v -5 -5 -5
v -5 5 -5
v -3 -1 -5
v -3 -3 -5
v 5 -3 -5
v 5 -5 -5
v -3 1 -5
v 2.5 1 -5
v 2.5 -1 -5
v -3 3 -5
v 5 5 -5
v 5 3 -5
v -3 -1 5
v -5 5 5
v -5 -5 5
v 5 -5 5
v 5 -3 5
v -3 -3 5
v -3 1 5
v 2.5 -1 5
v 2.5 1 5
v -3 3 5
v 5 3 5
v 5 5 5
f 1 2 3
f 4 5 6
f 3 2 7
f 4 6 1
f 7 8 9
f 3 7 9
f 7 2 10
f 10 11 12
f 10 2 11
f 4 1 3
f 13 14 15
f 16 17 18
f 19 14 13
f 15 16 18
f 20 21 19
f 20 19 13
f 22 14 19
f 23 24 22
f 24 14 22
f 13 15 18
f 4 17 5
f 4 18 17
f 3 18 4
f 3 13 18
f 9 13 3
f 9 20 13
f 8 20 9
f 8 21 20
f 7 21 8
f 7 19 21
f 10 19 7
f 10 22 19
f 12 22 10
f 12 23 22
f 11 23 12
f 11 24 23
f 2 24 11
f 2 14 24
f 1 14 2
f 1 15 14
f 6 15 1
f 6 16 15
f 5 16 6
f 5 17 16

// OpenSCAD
// Generated by SolidPython 1.1.3 on 2025-02-20 02:12:07
$fn=50;


translate(v = [-5.0000000000, -5.0000000000, -5.0000000000]) {
	linear_extrude(height = 10) {
		polygon(points = [[0, 0], [10, 0], [10, 2.0000000000], [2.0000000000, 2.0000000000], [2.0000000000, 4.0000000000], [7.5000000000, 4.0000000000], [7.5000000000, 6.0000000000], [2.0000000000, 6.0000000000], [2.0000000000, 8.0000000000], [10, 8.0000000000], [10, 10], [0, 10]]);
	}
}
/***********************************************
*********      SolidPython code:      **********
************************************************
 
from solid import *
from solid.utils import *

import math
import matplotlib.pyplot as plt
import subprocess
import os

class Hole:
    def __init__(self, x, y, radius):
        """
        Hole defined by:
        :param x: x dimension for center point of the circle as a ratio of letter height
        :param y: y dimension for center point of the circle as a ratio of letter height
        :param radius: radius of circle as a ratio of letter height
        """
        self.x = x
        self.y = y
        self.radius = radius

class Letter3D:
    def __init__(self, name, outer_shape_points, height, holes=[]):
        """
        3D Letter defined by:
        :param name: name of letter
        :param outer_shape_points: points defining the outer shape of the letter
        :param heigh: size of cube that letter fits inside
        :param holes: list of Holes
        """
        self.name = name
        self.outer_shape_points = outer_shape_points
        self.holes = holes
        self.height = height

    def render(self):
        shape = polygon(points=self.outer_shape_points)

        if self.holes:
            for hole in self.holes:
                circle_hole = circle(r=hole.radius*self.height)
                positioned_hole = translate([hole.x*self.height, hole.y*self.height])(circle_hole)
                shape = difference()(shape, positioned_hole)
        
        shape_3d = linear_extrude(height=self.height)(shape)
        shape_3d = translate([-self.height/2, -self.height/2, -self.height/2])(shape_3d)
        
        scad_render_to_file(shape_3d, f"output/{self.name}.scad", file_header='$fn=50;')
        subprocess.run(["C:\\Program Files\\OpenSCAD\\openscad.exe", "-o", f"output\\{self.name}.stl", f"output\\{self.name}.scad"])
                

def arc_points(radius, start_angle, end_angle, center=[0,0], num_points=50):
    angles = [start_angle + i * (end_angle - start_angle) / (num_points - 1)
              for i in range(num_points)]
    points = [
        (center[0] + radius * math.cos(math.radians(angle)),
         center[1] + radius * math.sin(math.radians(angle)))
        for angle in angles
    ]
    return points

def letter_A(h):
    shape_points = [(0,0), (h/2, h), (h, 0), (5/6*h, 0), (2/3*h, 1/3*h), (1/3*h, 1/3*h), (h/6, 0)]
    holes = [Hole(1/2, 7/12, 1/6)]
    A = Letter3D("A", shape_points, h, holes)
    return A.render()


def letter_B(h):
    top_arc_points = arc_points(h/4, 90, -90, center=[3/4*h, 3/4*h])
    bottom_arc_points = arc_points(h/4, 90, -90, center=[3/4*h, h/4])
    other_points = [(0,0),(0,h)]

    shape_points = top_arc_points + bottom_arc_points + other_points
    holes = [Hole(1/2, 3/4, 1/6), Hole(1/2, 1/4, 1/6)]
    B = Letter3D("B", shape_points, h, holes)
    return B.render()

def letter_C(h):
    outer_arc_points = arc_points(h/2, 30, 330)
    inner_arc_points = arc_points(h/4, 30, 330)[::-1]
    shape_points = outer_arc_points + inner_arc_points
    C = Letter3D("C", shape_points, h)
    return C.render()


def letter_D(h):
    outer_arc_points = arc_points(h/2, 90, -90, center= [h/2, h/2])
    shape_points = outer_arc_points + [(0,0), (0, h)]
    holes = [Hole(1/2, 1/2, 1/6)]
    D = Letter3D("D", shape_points, h, holes)
    return D.render()

def letter_E(h):
    points = [(0,0), (h,0), (h,h/5), (h/5,h/5), (h/5,2/5*h), (3/4*h,2/5*h), (3/4*h,3/5*h), (h/5,3/5*h), (h/5,4/5*h), (h,4/5*h), (h,h), (0,h)]
    E = Letter3D("E", points, h)
    return E.render()

if __name__ == "__main__":
    os.makedirs("output", exist_ok=True)

    # Just the letter B
    letter_E(10)

    # Intersection of A and A
    # a1 = translate([0,0,0])(letter_A(10))
    # a2 = translate([0,0,0])(rotate(a=90, v=[0,1,0])(letter_B(10)))
    # combined = intersection()(a1, a2)
    # scad_render_to_file(combined, "AB.scad")
    # subprocess.run(["C:\\Program Files\\OpenSCAD\\openscad.exe", "-o", "AB.stl", "AB.scad"])
 
 
************************************************/
